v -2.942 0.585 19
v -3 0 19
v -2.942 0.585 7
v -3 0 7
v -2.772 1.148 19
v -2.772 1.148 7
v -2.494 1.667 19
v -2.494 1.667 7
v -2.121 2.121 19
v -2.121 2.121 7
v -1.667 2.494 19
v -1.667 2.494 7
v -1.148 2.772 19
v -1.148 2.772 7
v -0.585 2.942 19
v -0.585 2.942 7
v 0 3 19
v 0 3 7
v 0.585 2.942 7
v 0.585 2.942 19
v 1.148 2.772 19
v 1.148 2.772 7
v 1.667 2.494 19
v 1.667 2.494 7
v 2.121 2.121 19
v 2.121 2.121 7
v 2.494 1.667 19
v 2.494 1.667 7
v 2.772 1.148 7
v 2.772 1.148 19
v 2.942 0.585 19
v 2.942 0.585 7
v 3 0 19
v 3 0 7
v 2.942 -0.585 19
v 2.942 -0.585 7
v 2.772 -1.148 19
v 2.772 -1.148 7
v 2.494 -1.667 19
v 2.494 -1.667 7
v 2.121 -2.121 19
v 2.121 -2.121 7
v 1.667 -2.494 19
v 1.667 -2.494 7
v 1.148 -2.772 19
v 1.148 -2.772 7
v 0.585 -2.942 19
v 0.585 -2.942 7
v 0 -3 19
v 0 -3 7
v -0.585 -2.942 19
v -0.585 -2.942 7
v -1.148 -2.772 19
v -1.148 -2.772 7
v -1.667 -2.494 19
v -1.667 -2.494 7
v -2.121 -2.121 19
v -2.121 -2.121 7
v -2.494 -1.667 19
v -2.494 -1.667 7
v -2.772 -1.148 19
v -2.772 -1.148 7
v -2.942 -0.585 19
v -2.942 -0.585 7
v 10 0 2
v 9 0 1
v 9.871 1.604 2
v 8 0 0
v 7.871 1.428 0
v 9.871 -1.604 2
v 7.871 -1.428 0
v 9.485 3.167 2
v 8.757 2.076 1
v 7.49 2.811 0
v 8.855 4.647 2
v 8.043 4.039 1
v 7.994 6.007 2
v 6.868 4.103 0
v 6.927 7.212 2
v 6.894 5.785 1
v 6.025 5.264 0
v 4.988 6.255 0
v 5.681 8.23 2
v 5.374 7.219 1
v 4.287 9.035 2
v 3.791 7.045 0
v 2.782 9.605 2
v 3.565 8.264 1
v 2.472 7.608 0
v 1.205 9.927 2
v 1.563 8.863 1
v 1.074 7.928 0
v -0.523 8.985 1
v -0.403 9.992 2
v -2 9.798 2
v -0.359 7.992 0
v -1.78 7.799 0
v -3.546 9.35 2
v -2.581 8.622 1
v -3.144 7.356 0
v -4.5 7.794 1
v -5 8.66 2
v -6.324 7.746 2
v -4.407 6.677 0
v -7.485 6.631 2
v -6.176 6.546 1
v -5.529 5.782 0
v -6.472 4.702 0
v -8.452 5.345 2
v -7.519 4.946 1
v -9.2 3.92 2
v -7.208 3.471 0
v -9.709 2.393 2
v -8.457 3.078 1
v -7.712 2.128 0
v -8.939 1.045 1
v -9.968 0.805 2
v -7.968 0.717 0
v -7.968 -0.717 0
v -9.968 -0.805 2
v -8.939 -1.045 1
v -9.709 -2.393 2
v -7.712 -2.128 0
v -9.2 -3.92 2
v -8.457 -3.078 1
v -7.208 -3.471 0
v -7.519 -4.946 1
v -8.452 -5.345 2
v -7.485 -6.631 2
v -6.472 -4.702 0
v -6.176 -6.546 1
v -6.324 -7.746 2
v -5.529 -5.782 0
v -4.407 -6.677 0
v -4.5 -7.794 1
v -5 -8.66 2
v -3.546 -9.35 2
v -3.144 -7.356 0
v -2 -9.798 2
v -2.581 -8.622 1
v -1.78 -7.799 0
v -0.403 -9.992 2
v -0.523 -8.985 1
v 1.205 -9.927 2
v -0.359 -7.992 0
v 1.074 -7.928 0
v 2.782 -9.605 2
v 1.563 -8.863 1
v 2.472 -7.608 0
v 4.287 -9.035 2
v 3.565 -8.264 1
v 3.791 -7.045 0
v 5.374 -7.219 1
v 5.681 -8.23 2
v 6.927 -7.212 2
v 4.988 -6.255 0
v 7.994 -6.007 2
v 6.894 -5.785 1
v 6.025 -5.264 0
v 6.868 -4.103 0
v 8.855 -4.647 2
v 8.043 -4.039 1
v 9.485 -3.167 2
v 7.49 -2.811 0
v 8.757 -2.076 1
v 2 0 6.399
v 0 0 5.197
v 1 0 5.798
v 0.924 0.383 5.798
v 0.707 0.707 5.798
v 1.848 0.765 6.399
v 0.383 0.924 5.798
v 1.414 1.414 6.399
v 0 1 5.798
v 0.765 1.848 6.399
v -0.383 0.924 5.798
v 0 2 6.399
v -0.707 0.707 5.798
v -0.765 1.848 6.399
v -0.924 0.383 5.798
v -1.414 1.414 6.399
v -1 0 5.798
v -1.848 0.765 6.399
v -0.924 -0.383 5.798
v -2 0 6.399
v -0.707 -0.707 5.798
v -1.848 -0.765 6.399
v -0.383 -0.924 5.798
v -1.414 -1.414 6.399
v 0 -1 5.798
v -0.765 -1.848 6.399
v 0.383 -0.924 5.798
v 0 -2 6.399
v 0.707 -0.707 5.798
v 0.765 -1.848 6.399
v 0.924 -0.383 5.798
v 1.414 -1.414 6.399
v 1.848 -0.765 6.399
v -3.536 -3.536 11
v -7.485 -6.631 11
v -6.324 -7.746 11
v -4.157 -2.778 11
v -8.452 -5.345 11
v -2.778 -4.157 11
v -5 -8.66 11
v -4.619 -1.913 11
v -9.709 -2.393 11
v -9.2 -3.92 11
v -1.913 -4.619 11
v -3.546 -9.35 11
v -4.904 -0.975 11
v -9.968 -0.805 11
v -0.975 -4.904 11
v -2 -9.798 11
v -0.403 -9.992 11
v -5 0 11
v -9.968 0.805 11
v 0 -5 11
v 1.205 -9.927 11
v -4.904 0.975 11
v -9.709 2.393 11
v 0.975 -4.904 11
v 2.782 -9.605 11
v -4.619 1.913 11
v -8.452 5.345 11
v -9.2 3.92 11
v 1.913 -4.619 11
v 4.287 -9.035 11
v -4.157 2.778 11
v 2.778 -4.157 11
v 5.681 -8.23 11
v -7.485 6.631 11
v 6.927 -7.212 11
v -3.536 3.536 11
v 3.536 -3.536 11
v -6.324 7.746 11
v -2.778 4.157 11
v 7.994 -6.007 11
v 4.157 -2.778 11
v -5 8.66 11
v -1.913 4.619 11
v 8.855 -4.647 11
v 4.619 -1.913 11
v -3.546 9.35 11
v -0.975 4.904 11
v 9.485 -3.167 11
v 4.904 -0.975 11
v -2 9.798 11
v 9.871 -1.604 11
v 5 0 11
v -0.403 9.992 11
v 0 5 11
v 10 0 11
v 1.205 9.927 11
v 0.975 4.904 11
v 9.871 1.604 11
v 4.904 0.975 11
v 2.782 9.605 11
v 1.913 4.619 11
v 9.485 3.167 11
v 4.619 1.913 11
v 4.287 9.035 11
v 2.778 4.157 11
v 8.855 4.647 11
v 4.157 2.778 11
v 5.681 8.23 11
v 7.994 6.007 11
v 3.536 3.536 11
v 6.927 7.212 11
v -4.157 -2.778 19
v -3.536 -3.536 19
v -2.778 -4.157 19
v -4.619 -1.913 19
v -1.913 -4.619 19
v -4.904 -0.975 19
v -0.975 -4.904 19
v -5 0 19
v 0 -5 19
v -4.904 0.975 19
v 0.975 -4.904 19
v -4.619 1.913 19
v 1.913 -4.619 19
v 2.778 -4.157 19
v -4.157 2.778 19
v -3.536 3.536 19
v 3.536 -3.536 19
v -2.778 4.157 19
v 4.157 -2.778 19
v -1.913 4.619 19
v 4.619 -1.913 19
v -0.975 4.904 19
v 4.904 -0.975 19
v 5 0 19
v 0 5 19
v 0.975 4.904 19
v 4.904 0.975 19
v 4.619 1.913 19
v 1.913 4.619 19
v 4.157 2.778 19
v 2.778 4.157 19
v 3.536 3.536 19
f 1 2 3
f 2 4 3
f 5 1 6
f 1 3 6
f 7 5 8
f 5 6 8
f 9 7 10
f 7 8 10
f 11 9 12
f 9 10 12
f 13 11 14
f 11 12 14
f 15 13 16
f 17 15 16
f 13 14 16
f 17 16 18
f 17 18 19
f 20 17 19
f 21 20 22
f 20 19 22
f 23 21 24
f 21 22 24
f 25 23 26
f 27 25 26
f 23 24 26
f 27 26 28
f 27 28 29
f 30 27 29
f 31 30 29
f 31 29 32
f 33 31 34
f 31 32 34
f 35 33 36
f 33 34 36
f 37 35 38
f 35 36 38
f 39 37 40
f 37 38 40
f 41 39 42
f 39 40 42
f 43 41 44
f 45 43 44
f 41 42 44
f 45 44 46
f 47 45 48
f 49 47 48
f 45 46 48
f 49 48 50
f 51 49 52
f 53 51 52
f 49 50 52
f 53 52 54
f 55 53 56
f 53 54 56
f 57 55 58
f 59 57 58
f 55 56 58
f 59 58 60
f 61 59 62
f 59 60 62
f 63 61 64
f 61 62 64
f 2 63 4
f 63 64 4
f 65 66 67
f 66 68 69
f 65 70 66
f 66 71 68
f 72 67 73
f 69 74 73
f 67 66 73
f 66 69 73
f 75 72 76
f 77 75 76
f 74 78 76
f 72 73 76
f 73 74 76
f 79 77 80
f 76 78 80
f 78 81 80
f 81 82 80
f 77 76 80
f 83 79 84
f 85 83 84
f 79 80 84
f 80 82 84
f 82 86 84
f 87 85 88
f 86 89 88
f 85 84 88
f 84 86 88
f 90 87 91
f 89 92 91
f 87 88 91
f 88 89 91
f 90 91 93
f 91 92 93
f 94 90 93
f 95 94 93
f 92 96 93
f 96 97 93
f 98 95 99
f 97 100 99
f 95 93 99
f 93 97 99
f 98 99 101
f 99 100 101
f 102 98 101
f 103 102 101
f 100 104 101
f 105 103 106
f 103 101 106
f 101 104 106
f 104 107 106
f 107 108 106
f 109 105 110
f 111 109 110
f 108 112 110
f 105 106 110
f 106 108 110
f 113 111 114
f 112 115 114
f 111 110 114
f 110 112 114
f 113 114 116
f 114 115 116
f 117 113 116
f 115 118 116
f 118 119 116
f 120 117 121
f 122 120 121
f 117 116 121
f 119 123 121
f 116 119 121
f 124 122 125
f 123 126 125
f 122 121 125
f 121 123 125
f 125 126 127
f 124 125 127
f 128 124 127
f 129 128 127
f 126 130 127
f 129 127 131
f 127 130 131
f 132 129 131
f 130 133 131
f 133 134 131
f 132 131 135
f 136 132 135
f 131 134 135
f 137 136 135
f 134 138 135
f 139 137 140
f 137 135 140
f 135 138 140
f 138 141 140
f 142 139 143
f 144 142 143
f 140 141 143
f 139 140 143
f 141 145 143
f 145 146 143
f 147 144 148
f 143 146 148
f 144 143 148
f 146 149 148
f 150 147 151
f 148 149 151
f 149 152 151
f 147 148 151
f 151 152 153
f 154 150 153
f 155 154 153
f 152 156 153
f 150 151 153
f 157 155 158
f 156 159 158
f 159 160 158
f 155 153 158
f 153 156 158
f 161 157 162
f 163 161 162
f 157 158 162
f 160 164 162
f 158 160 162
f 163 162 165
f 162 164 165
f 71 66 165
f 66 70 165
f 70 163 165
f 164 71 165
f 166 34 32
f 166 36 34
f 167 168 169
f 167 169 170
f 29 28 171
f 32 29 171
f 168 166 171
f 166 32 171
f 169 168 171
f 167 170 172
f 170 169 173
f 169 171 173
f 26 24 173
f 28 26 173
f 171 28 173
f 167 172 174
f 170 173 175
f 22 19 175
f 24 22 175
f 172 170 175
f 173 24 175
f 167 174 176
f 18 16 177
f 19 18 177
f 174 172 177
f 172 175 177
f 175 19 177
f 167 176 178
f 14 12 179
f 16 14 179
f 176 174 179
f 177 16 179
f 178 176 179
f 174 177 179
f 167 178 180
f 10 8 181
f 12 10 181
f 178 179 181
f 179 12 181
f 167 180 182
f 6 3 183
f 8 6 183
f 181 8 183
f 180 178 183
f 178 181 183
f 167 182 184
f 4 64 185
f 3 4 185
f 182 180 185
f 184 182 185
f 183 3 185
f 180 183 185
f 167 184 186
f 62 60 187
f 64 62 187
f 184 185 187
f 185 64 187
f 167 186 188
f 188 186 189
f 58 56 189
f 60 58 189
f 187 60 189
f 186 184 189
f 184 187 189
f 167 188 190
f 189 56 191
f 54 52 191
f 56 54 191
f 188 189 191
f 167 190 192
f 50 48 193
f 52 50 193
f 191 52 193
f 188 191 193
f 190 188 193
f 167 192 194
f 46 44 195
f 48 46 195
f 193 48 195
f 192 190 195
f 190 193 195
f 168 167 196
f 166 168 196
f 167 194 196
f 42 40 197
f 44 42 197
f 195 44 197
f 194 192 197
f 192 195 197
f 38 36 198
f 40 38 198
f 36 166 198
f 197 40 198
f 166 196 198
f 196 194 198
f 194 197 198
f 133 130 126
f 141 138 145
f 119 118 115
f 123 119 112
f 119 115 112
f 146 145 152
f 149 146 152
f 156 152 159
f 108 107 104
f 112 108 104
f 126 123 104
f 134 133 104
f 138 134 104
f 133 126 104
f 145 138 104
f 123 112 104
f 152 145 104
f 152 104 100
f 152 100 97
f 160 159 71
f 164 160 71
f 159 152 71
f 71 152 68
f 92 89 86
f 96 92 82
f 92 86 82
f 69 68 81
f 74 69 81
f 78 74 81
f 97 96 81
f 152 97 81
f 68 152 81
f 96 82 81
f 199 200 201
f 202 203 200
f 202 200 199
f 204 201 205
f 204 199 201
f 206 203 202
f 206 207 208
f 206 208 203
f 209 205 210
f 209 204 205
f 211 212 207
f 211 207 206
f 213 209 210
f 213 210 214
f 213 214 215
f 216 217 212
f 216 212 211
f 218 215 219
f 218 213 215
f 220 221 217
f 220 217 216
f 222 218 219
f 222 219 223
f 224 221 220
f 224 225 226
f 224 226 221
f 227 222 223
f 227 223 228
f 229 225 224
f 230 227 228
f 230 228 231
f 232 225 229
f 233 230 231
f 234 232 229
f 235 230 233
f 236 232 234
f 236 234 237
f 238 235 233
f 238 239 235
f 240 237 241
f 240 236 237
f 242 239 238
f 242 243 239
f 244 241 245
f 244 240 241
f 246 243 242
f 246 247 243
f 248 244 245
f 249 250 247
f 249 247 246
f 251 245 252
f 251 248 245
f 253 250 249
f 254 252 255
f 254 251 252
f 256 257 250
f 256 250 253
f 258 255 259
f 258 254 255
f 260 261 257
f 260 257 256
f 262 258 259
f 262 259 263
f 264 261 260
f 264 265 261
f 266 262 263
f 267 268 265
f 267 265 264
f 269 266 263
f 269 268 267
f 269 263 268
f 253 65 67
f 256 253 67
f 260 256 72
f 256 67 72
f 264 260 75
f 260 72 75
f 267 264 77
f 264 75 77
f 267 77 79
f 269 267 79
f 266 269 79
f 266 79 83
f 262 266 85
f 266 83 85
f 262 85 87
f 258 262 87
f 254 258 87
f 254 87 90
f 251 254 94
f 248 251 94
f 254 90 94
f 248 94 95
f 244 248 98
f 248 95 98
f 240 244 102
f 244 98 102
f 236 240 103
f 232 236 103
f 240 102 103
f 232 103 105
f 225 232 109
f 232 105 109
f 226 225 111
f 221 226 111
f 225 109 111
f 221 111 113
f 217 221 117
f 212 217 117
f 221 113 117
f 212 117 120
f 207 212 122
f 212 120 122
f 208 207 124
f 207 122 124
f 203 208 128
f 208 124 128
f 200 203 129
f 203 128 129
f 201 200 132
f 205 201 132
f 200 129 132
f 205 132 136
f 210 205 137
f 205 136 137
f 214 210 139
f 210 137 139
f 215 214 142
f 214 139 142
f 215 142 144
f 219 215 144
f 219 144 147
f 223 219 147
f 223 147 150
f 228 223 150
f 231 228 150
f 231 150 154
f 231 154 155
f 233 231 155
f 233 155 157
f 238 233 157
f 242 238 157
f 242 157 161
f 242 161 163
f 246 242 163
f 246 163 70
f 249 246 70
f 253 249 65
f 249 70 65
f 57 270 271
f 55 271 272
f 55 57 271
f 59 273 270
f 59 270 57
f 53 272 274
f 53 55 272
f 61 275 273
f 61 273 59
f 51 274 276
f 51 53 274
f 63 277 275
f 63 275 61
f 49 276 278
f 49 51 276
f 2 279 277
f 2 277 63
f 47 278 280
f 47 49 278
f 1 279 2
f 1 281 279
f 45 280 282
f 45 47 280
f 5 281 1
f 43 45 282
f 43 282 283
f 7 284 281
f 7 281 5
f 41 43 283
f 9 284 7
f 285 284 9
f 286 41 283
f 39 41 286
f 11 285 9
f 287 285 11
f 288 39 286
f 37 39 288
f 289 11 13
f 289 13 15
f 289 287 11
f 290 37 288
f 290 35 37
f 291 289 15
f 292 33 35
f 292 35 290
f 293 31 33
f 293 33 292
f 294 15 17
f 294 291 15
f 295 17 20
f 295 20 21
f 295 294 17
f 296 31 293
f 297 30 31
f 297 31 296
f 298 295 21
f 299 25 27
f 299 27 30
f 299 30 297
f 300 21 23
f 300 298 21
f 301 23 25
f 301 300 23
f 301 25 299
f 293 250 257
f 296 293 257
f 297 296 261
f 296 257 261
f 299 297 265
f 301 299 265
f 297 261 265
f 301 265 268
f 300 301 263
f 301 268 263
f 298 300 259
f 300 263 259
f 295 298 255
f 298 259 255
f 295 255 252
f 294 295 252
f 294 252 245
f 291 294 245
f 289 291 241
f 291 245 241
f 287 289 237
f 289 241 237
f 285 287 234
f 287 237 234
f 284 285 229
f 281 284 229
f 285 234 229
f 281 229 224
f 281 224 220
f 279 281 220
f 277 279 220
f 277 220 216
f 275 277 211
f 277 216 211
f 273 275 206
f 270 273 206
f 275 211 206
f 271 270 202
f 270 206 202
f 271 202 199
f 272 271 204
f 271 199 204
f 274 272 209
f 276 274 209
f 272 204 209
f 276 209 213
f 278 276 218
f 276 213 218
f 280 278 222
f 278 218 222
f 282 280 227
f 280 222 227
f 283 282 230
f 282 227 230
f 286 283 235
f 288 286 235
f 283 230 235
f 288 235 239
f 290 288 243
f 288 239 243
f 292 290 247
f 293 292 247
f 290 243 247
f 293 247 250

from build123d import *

# Parameters (mm, degrees)
F0_R     = 10
F1_DEPTH = 11
F2_R     = 5
F3_DEPTH = 8
F5_D     = 6
F5_DEPTH = 12
F5_TIP   = 1.8025818571
F6_SIZE  = 2


with BuildPart() as f1:
    # F0 (on Top) → F1 (new body)
    with BuildSketch(Plane.XY):
        Circle(F0_R)
    extrude(amount=F1_DEPTH)

    # F2 (on face) → F3 (join)
    with BuildSketch(Plane.XY.offset(11)):
        Circle(F2_R)
    extrude(amount=F3_DEPTH)

    # F5
    with Locations(Plane.XY.offset(19)):
        with Locations((0, 0)):
            Hole(F5_D / 2, depth=F5_DEPTH)
            with Locations((0, 0, -(F5_DEPTH + F5_TIP / 2))):  # 118° drill point
                Cone(0, F5_D / 2, F5_TIP, mode=Mode.SUBTRACT)

    # F6
    f6_edges = [f1.edges().sort_by_distance(p)[0] for p in [
        (-10, 0, 0),
    ]]
    chamfer(f6_edges, length=F6_SIZE)


solid = f1.part
